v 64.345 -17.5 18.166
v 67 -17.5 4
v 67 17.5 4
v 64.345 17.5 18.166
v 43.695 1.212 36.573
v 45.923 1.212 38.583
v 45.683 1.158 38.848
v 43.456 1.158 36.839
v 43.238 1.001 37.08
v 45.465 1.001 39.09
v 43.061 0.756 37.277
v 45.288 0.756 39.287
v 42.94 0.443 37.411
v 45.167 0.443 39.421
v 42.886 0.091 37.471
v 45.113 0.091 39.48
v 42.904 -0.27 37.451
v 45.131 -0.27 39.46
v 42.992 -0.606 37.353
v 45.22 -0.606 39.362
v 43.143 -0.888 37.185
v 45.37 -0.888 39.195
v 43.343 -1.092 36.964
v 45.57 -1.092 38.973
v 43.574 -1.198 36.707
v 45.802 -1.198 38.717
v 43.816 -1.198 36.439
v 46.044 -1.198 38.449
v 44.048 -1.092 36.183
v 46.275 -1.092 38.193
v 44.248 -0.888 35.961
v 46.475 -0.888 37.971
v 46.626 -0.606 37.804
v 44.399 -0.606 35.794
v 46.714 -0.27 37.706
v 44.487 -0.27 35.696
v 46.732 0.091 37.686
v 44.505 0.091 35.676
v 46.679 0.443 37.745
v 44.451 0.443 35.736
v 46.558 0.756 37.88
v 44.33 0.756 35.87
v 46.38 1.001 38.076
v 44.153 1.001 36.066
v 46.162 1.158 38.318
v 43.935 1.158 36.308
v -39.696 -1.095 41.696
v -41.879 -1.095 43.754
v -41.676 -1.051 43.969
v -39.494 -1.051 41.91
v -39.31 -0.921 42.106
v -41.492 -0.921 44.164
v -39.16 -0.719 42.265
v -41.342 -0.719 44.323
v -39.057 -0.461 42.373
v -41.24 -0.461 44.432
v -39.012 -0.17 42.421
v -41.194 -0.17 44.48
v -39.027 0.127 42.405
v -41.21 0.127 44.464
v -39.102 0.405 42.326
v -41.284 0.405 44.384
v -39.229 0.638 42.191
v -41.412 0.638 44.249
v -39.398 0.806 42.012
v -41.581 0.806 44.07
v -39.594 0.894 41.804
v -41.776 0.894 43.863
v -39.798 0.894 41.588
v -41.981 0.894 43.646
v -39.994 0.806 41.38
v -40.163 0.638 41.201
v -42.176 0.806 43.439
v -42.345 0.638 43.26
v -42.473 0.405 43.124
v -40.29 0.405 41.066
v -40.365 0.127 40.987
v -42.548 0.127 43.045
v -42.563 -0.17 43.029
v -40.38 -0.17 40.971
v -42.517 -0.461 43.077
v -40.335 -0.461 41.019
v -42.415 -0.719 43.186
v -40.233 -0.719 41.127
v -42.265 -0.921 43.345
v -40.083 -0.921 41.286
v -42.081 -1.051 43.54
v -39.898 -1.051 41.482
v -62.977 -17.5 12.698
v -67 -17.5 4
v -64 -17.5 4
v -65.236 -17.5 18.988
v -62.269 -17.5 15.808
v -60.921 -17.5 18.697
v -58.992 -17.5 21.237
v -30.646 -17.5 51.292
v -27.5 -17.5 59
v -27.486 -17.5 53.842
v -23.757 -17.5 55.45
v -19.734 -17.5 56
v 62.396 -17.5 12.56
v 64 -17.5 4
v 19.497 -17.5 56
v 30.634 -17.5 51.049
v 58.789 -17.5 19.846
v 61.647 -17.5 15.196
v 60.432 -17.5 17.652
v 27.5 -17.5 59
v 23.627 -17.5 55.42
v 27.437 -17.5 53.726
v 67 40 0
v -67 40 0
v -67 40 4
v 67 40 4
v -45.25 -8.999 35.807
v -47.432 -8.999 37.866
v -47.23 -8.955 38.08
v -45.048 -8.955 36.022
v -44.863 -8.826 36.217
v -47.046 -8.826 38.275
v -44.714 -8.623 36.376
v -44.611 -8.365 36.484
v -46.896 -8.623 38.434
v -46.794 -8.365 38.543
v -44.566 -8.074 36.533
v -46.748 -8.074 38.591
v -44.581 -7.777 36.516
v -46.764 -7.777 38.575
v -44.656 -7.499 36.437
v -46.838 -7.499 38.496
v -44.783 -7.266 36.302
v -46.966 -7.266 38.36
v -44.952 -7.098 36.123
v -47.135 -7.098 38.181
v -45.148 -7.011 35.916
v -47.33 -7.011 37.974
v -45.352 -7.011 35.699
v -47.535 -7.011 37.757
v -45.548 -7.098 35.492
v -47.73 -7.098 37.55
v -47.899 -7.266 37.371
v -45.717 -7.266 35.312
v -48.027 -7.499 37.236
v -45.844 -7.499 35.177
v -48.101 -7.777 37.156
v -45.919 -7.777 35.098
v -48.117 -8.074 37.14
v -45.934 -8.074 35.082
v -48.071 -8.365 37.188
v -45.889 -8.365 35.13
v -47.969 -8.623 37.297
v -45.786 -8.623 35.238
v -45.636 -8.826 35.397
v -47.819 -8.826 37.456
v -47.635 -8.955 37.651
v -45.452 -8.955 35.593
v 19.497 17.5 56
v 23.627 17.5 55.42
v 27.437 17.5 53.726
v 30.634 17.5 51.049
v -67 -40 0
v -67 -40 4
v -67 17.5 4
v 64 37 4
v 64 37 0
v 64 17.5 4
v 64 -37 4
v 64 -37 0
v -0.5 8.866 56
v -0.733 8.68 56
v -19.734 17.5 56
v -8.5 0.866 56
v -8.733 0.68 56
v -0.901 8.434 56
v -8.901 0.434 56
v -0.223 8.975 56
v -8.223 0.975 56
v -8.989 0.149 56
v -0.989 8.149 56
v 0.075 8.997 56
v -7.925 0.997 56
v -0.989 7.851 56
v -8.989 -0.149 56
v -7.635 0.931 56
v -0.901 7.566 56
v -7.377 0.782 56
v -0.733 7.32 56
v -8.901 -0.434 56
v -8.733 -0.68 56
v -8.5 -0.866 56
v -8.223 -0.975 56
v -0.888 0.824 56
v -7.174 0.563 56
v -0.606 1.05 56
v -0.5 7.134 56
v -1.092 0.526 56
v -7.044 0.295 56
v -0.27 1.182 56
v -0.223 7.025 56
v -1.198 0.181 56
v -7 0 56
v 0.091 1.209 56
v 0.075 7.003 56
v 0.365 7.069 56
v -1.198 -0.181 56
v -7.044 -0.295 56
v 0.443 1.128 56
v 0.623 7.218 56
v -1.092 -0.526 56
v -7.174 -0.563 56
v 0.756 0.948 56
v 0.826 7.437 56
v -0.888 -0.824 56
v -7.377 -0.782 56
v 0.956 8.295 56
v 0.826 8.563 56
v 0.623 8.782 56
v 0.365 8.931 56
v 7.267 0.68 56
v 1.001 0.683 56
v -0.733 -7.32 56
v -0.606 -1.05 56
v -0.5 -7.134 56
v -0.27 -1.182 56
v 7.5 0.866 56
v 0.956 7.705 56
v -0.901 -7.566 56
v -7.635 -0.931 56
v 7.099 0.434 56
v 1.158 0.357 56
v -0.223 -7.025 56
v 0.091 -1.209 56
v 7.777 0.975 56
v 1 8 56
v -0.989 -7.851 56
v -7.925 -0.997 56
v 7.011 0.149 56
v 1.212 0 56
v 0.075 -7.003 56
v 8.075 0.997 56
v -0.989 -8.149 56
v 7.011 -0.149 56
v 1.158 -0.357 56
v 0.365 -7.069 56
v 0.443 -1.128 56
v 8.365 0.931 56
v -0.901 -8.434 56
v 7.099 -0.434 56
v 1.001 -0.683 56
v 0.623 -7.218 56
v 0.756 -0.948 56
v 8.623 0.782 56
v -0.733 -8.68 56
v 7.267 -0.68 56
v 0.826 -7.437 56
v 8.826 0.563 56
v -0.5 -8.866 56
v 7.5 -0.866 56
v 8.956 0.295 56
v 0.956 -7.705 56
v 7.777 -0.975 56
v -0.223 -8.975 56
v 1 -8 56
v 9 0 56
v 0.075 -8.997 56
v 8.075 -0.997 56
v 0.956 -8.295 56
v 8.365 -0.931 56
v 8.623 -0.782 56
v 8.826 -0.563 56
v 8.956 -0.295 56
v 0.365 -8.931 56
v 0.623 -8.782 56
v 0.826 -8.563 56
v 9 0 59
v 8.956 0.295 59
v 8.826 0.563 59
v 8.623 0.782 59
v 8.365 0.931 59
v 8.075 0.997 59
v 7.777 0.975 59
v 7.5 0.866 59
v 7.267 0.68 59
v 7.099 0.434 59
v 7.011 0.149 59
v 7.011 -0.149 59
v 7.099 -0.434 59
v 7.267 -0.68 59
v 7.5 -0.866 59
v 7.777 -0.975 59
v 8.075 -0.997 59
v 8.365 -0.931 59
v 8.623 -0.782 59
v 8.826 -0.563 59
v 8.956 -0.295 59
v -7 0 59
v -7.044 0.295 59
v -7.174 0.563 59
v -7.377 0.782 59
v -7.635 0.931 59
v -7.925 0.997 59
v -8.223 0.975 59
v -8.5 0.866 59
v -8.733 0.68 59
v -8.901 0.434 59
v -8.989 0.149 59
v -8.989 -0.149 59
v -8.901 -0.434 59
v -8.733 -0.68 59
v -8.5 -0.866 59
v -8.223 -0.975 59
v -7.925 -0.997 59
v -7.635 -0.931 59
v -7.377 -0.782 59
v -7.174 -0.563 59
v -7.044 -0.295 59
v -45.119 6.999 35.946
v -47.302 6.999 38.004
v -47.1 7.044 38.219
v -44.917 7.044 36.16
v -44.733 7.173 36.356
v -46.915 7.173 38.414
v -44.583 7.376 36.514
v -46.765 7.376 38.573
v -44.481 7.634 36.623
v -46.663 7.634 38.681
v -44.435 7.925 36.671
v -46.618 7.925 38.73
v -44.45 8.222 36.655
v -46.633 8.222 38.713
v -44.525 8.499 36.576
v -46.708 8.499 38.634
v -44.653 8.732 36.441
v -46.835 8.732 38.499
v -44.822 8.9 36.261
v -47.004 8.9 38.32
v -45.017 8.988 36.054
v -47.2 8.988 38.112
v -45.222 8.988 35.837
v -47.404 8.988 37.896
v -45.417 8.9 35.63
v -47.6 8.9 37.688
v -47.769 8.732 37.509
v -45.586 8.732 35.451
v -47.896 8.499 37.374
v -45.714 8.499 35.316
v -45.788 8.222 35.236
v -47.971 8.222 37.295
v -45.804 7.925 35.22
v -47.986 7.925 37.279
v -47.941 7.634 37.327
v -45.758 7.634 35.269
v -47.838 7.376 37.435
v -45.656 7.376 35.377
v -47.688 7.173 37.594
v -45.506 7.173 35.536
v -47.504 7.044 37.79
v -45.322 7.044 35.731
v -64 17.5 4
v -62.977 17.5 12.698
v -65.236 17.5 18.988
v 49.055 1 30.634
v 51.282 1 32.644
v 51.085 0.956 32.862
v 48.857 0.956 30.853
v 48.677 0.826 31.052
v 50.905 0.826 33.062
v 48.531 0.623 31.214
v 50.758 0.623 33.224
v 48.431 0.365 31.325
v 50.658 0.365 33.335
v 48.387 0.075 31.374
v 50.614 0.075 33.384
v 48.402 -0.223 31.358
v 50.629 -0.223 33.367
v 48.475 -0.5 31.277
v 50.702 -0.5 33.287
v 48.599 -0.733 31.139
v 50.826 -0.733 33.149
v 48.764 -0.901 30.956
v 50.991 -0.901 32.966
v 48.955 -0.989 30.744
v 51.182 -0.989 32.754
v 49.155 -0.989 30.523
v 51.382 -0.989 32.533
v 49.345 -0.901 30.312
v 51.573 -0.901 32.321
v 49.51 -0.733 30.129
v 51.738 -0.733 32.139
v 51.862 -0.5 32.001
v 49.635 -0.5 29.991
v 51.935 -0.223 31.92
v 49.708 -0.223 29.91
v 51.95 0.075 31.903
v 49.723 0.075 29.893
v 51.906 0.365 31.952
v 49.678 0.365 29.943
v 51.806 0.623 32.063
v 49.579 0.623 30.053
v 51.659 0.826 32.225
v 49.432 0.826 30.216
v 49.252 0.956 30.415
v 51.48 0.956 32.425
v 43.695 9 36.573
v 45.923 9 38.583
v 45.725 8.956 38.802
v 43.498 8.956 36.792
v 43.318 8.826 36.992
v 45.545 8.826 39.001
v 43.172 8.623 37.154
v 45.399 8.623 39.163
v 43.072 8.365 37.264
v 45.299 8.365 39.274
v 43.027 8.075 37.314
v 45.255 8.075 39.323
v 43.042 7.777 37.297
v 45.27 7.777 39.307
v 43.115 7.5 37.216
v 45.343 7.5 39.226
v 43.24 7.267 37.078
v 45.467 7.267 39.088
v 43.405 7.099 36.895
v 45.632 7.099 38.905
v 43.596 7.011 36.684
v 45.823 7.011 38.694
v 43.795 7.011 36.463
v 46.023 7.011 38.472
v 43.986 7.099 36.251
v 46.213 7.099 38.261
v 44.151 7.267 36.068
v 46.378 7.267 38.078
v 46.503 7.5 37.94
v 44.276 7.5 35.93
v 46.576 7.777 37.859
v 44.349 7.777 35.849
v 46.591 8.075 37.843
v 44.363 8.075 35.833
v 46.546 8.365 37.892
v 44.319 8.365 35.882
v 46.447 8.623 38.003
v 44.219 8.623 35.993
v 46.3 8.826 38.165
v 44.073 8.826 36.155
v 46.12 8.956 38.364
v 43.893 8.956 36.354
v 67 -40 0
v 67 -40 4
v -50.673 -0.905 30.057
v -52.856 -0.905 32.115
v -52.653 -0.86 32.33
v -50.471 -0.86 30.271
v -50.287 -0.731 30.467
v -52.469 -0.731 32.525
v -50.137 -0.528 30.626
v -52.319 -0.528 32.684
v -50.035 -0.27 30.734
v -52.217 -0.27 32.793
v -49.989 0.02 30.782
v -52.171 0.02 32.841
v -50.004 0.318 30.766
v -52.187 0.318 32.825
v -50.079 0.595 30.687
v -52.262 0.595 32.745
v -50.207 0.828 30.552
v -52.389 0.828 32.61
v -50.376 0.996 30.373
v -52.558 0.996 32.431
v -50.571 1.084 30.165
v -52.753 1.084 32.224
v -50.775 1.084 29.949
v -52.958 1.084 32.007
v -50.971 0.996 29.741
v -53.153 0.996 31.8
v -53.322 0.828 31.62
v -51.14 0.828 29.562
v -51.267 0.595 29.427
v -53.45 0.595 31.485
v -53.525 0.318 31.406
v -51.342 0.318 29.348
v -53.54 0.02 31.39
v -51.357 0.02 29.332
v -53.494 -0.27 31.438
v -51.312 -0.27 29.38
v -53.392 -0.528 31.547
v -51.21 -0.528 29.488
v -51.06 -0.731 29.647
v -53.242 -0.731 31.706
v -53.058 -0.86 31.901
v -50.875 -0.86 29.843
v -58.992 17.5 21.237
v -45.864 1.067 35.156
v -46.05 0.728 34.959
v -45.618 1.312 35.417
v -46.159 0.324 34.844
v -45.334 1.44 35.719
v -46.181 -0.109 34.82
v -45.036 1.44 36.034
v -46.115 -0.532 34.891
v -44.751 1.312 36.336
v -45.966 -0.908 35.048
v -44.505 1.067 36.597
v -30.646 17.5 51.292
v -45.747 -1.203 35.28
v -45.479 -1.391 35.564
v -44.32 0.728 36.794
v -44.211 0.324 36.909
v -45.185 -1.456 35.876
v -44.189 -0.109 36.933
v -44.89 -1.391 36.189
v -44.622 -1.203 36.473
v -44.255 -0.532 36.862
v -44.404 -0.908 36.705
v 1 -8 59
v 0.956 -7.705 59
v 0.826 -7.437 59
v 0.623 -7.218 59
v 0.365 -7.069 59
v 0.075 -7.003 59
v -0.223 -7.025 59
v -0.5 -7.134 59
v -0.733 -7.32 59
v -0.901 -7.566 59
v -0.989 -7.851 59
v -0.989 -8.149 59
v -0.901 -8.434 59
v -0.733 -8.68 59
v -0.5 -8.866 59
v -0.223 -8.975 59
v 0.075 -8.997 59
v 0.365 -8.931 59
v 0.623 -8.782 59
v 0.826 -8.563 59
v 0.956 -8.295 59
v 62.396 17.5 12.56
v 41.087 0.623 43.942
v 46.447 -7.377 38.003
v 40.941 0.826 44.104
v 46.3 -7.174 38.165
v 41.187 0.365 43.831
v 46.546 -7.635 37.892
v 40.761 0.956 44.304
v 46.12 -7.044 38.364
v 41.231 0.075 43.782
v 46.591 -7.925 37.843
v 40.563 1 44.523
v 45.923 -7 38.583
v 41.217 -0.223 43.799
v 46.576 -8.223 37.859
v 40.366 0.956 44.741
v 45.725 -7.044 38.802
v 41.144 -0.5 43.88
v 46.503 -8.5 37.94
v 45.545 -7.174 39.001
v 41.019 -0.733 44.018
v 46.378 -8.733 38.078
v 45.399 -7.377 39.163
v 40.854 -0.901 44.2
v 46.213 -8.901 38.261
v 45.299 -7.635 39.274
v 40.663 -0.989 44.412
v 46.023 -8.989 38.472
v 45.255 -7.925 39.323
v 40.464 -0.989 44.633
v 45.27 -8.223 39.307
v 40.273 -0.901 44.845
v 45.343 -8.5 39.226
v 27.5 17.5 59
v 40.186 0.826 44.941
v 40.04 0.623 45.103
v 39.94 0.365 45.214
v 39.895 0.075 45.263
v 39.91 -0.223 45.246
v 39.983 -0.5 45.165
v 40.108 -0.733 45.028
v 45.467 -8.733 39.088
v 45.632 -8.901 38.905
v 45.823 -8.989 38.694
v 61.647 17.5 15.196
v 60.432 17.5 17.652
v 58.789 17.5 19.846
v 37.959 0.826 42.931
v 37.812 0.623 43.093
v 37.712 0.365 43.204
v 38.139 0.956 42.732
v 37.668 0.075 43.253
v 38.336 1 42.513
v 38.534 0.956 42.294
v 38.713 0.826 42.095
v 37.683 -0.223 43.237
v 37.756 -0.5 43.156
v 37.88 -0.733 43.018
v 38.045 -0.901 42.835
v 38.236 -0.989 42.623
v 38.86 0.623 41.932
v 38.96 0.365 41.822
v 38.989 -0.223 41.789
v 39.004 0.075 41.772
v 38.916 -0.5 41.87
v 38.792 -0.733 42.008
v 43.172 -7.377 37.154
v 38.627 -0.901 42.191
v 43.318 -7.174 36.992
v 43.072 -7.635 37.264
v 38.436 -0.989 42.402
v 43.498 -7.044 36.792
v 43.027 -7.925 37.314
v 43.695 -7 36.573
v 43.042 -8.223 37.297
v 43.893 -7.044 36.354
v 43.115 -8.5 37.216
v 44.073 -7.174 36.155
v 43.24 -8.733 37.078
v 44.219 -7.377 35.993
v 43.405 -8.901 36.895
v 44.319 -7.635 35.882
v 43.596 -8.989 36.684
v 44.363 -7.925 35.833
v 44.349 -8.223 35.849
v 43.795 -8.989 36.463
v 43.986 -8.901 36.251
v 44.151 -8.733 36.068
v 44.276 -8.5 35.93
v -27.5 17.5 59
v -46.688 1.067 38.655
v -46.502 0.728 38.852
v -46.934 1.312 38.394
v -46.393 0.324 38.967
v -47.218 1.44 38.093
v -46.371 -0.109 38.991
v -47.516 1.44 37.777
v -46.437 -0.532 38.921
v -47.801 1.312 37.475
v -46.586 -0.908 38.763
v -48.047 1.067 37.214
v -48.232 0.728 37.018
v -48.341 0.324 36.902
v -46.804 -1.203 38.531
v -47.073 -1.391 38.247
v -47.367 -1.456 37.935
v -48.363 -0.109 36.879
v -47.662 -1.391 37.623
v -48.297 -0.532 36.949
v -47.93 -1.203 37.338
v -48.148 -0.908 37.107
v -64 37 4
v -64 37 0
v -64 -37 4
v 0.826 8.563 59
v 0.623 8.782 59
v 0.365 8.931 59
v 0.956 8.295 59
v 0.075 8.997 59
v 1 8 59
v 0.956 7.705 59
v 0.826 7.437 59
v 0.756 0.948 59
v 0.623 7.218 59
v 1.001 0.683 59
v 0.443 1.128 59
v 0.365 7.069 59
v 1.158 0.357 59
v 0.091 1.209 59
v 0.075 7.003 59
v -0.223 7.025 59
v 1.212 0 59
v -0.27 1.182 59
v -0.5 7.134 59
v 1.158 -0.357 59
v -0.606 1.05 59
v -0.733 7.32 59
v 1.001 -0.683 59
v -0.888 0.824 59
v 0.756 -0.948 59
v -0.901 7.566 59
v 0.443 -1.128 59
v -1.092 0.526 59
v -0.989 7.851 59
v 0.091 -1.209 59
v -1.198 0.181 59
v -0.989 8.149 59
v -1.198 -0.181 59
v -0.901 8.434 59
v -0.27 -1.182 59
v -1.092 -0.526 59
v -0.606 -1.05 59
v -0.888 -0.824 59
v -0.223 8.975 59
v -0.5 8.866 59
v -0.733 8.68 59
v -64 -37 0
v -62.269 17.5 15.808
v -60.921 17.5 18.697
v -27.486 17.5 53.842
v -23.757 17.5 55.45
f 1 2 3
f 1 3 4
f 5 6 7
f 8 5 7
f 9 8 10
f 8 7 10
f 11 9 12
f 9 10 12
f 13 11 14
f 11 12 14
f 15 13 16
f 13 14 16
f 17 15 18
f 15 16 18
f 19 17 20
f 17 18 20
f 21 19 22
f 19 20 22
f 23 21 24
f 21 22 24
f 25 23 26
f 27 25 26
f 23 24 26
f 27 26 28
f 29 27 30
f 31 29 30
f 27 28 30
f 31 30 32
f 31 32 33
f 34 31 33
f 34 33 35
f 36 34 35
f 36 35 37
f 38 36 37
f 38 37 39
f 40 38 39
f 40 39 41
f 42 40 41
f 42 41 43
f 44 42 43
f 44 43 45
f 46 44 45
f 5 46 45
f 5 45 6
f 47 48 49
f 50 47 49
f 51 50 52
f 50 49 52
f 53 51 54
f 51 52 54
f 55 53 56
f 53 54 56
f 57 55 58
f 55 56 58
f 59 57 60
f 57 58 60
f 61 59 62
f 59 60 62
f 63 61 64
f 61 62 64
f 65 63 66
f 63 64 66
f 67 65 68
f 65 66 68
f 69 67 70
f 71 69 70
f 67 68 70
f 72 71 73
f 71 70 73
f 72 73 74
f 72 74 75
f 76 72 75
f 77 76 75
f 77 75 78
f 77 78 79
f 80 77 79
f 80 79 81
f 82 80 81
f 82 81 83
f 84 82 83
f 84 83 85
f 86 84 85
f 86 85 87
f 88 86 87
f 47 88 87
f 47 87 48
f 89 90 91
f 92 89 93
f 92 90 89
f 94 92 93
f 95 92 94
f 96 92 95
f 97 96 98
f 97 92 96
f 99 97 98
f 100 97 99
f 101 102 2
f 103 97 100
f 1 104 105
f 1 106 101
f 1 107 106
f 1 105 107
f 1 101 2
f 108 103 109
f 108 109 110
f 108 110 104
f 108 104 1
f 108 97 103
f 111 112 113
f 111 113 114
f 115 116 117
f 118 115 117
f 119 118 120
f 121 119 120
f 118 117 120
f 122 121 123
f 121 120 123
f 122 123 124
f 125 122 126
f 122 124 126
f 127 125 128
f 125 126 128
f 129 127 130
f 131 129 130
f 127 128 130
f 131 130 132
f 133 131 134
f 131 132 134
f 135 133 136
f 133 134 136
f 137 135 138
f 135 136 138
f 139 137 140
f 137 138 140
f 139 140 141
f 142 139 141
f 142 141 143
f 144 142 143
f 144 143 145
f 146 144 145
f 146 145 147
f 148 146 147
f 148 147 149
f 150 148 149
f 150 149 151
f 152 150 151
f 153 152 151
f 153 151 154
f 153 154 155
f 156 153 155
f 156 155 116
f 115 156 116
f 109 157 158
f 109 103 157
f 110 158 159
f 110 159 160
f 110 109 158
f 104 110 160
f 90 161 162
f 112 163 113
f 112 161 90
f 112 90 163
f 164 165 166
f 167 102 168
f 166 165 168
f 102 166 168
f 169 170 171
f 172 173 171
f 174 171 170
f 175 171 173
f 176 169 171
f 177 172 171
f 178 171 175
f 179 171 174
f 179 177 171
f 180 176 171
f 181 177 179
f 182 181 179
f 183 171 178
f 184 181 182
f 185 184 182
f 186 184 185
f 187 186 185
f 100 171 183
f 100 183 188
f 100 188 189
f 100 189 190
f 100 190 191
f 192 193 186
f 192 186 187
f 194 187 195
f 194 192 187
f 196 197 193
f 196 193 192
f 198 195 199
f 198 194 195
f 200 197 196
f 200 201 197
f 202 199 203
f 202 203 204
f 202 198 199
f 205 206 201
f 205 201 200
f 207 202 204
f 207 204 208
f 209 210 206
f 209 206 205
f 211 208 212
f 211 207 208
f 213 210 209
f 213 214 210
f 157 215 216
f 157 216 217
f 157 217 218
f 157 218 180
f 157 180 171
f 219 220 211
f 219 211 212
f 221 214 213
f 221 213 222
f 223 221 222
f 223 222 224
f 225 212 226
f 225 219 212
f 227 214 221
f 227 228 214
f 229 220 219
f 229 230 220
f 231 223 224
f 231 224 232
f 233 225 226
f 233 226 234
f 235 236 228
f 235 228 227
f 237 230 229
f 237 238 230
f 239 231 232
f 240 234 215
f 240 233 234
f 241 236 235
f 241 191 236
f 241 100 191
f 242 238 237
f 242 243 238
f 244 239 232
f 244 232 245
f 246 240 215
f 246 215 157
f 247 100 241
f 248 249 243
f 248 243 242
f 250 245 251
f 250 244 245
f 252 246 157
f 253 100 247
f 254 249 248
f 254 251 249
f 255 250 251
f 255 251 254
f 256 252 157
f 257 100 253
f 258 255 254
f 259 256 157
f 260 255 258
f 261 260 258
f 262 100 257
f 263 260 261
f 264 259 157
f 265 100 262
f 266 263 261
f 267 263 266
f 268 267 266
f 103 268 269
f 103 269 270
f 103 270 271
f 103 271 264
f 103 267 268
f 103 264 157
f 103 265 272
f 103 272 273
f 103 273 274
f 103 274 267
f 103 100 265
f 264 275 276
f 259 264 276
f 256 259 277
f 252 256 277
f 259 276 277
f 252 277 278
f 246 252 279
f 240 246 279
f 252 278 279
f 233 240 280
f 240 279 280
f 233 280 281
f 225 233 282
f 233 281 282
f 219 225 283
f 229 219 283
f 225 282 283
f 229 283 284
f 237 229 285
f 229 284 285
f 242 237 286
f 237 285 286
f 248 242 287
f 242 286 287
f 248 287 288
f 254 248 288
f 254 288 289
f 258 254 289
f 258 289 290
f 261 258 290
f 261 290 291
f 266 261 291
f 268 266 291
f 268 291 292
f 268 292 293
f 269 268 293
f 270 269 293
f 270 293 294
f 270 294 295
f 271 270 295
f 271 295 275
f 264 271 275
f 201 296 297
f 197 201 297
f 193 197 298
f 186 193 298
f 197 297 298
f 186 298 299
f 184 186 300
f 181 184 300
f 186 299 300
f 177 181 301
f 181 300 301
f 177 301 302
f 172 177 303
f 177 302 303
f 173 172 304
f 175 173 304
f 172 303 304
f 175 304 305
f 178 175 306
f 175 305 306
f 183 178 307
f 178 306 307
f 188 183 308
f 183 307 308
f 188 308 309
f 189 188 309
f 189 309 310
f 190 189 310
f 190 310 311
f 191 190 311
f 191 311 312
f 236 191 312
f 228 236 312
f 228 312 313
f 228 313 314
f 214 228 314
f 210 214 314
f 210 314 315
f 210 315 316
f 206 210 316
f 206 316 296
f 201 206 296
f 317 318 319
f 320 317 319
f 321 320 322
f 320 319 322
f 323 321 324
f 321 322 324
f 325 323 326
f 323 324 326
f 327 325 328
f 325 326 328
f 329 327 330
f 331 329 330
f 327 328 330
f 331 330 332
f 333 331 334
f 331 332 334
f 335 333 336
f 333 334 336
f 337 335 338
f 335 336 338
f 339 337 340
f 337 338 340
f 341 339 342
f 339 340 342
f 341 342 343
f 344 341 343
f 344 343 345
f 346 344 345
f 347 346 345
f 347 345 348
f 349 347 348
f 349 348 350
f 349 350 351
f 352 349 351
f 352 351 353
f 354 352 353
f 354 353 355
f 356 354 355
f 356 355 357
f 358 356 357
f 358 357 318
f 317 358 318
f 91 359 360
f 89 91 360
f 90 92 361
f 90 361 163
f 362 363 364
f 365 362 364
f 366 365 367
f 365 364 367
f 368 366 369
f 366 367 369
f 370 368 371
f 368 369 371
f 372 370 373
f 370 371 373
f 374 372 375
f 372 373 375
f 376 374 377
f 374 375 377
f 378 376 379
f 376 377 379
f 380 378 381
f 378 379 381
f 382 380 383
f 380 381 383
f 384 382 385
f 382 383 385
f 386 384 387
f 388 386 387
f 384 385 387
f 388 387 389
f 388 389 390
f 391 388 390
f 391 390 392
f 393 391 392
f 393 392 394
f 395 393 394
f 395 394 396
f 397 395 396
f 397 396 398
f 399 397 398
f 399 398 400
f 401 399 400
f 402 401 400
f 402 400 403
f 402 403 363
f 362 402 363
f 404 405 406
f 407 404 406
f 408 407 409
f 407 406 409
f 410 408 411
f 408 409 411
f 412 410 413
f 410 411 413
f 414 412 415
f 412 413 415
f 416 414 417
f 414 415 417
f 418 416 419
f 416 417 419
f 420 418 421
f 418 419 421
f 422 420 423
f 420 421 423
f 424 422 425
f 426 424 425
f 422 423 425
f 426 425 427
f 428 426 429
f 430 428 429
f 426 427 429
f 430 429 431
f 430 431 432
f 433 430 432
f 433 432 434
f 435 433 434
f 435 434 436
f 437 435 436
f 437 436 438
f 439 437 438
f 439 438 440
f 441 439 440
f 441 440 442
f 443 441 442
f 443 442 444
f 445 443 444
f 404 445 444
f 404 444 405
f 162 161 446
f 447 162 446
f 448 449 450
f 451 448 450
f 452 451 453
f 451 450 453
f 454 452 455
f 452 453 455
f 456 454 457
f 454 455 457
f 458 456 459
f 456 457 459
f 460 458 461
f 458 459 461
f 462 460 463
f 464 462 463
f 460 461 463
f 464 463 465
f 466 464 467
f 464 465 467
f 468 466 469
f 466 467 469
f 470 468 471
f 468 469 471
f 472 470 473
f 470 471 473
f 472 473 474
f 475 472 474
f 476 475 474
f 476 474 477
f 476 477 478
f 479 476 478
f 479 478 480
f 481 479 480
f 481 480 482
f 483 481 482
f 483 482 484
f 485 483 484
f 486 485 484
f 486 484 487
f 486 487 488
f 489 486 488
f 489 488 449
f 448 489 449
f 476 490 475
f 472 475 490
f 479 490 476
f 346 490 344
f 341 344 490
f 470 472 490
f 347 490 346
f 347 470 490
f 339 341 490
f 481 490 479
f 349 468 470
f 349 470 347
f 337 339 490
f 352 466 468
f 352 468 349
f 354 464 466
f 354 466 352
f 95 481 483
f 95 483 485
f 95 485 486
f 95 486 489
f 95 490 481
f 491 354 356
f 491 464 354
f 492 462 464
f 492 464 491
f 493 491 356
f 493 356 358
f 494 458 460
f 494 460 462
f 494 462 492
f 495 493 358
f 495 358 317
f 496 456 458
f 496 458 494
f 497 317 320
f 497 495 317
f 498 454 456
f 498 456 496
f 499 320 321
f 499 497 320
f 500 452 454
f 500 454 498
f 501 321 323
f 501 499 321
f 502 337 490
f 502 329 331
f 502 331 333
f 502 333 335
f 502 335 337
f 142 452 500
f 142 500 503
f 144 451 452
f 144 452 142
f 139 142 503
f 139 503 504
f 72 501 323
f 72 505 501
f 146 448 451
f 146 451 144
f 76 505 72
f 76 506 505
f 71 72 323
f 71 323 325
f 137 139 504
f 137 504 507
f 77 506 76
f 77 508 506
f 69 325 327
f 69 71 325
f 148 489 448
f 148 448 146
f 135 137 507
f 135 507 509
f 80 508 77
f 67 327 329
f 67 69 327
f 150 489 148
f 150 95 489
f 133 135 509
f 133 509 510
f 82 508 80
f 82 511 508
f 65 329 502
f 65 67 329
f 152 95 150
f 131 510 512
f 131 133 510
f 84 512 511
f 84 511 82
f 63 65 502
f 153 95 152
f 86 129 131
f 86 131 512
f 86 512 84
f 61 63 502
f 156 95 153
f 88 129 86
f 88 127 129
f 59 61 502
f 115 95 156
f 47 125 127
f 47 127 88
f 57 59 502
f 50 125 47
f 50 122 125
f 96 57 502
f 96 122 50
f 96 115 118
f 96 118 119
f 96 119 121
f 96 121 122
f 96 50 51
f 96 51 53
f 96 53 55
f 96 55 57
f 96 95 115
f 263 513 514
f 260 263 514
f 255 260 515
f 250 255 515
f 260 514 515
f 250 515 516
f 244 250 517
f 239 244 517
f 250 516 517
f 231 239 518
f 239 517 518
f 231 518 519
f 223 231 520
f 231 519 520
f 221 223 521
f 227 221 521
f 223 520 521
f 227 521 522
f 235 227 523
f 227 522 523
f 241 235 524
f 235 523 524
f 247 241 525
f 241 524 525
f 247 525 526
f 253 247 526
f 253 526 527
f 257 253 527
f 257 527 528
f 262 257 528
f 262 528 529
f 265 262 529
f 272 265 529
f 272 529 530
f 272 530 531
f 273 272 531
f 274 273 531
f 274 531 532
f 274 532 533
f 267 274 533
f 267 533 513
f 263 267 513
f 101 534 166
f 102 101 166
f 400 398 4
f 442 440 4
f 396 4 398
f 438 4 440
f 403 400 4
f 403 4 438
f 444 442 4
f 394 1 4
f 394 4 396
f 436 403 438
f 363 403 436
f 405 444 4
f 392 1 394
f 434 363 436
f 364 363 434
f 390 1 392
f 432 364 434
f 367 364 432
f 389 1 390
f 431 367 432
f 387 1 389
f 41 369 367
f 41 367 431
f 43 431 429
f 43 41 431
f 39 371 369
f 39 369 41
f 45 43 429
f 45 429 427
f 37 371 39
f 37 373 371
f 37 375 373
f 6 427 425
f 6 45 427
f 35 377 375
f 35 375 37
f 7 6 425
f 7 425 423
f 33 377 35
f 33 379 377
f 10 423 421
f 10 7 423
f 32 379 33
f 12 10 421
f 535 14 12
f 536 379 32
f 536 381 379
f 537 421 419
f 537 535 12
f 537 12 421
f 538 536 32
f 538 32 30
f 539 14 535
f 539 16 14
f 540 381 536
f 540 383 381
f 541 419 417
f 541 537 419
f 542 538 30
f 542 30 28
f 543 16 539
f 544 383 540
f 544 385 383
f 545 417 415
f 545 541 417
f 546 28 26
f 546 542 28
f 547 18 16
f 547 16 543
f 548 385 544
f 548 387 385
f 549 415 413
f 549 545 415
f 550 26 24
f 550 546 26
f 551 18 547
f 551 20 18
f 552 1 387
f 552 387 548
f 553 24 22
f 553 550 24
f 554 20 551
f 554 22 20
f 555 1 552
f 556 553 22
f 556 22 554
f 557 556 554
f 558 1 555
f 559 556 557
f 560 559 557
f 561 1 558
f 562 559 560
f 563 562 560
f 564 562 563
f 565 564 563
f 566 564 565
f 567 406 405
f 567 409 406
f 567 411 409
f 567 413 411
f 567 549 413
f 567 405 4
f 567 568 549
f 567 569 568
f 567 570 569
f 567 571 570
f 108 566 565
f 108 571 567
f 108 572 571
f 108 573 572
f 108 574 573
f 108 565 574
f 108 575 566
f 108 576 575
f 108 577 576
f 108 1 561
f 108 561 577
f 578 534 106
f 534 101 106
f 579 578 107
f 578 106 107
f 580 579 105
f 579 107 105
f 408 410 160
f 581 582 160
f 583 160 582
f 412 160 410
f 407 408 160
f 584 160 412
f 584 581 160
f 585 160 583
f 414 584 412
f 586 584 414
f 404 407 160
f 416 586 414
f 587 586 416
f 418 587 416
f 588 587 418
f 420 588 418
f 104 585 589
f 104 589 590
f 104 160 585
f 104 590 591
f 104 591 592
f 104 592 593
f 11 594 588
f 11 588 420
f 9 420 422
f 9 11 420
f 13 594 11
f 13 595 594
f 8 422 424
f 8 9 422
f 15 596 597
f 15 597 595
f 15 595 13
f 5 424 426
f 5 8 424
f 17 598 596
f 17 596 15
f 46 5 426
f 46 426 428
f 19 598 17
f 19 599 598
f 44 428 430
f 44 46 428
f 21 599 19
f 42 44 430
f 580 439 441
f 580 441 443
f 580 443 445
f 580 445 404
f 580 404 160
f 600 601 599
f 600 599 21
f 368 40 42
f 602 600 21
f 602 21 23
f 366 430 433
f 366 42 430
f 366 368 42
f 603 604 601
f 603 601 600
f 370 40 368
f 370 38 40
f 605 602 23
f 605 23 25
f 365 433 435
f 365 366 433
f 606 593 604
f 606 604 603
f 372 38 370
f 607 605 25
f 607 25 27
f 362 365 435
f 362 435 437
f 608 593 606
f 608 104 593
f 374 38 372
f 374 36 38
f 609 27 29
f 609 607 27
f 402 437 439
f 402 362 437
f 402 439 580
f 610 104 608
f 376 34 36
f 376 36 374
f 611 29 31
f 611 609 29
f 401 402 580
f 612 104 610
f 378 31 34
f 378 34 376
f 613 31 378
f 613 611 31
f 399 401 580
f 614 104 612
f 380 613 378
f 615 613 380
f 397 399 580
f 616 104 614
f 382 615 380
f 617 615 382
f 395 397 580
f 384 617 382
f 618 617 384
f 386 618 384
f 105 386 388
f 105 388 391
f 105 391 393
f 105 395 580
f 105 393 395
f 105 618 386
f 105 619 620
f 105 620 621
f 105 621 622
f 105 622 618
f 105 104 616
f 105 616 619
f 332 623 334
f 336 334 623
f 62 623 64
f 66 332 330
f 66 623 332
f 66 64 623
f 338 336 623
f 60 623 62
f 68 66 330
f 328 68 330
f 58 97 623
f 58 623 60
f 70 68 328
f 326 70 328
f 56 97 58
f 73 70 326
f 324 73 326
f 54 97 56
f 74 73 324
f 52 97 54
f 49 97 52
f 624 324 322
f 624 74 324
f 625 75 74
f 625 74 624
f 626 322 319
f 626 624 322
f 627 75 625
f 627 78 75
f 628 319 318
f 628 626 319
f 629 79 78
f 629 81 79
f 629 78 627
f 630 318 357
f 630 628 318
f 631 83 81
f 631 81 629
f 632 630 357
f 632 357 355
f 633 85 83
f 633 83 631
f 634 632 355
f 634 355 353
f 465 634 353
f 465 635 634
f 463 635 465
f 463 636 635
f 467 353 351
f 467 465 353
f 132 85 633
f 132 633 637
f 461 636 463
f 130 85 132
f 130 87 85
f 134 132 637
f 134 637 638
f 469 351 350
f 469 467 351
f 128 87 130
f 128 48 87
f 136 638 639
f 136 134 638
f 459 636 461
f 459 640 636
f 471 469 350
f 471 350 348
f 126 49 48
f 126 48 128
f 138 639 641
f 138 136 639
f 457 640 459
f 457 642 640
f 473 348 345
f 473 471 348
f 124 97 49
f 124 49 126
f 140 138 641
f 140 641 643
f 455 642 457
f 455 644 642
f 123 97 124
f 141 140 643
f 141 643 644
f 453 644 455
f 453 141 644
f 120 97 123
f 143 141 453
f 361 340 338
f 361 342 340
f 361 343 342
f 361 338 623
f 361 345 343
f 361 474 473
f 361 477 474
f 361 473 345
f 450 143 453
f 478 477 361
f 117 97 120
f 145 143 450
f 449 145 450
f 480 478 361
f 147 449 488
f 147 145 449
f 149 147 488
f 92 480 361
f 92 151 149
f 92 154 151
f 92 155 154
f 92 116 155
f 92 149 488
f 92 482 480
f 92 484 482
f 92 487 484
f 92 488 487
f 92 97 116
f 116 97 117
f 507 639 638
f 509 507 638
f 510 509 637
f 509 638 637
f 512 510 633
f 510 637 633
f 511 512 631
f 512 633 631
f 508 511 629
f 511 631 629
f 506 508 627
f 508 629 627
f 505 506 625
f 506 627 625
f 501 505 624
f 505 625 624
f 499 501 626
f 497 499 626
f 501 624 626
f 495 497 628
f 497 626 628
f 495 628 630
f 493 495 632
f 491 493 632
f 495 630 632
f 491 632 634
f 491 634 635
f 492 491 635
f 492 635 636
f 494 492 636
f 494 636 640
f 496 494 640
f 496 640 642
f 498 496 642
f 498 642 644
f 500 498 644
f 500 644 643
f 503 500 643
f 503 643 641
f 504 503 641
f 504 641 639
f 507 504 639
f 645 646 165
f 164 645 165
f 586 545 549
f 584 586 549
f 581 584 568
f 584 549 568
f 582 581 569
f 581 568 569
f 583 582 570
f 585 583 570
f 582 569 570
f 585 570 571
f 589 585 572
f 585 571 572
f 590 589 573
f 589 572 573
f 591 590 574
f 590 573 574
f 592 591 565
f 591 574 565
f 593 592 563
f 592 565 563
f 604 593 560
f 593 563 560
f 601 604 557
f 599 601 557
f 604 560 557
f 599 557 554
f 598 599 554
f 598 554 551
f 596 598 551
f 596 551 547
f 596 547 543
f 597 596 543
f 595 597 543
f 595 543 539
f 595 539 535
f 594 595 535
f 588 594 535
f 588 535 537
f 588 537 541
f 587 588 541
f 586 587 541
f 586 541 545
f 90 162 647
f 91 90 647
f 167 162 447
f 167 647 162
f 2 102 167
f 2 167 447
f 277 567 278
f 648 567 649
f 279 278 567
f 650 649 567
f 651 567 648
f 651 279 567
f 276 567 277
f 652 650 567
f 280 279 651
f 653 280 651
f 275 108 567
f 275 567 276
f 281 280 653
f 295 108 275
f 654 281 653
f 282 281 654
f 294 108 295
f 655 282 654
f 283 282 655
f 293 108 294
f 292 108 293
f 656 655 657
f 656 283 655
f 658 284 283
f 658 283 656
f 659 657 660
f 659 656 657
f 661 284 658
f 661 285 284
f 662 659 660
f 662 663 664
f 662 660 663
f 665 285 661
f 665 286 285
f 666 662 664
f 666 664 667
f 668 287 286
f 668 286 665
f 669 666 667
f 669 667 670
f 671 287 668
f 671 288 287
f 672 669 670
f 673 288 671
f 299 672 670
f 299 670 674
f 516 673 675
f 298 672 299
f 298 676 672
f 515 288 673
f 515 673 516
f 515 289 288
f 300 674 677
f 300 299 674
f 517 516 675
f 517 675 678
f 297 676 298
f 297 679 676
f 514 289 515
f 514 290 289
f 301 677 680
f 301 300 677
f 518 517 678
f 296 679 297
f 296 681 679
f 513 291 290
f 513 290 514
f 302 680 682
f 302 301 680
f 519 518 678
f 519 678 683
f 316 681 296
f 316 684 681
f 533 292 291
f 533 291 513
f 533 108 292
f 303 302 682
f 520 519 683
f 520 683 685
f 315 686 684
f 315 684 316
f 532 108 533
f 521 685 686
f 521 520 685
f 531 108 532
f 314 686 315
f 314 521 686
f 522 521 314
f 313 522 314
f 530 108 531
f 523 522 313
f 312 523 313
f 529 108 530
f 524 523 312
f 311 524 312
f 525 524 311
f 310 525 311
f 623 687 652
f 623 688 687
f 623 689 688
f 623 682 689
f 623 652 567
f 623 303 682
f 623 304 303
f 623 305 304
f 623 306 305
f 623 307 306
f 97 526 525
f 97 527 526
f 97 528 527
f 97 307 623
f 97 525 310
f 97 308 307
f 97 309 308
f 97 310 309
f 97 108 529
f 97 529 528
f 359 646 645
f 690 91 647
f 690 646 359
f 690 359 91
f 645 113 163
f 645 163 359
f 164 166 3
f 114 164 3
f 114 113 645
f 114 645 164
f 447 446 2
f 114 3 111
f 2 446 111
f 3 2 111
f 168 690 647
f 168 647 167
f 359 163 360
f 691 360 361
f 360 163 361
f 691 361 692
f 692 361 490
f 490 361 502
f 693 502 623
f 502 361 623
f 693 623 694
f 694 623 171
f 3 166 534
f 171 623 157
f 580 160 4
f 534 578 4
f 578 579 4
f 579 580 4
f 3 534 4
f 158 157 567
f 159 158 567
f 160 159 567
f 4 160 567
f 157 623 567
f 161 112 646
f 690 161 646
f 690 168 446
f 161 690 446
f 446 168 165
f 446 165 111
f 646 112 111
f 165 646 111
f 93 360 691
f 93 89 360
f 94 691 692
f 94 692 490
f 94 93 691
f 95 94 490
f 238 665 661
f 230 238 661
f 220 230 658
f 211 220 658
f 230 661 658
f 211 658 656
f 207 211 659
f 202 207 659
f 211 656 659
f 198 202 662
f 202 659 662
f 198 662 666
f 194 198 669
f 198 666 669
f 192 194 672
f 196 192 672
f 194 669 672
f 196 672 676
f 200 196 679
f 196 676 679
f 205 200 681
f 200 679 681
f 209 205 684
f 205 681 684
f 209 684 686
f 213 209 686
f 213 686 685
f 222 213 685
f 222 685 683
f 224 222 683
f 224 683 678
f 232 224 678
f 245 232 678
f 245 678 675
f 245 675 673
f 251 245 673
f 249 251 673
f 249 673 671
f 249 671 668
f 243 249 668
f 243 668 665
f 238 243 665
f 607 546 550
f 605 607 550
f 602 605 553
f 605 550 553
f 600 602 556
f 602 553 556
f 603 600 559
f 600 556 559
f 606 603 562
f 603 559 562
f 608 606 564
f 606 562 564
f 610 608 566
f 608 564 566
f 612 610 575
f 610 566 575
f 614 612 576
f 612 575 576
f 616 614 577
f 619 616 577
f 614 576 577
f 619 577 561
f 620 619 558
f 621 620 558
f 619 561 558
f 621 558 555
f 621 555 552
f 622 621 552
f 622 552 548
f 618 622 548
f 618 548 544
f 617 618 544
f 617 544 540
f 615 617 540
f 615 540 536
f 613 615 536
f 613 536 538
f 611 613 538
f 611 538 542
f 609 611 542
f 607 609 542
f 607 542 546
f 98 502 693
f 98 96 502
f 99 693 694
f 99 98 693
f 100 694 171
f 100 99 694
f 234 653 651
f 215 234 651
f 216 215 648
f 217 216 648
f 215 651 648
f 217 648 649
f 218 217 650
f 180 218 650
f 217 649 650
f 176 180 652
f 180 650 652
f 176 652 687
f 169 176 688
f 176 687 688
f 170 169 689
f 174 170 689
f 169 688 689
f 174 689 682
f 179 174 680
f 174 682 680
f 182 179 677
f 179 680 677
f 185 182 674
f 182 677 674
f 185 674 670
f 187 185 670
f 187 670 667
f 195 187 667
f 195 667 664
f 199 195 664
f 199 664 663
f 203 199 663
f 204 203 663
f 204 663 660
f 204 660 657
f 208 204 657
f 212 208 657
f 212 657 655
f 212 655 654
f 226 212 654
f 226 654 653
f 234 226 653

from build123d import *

# Parameters (mm, degrees)
F0_W          = 134
F0_H          = 80
F1_DEPTH      = 4
F2_W          = 128
F2_H          = 74
F2_W_2        = 122
F2_H_2        = 68
F3_DEPTH      = 2
F3_DEPTH_BACK = 4
F5_DEPTH      = 17.5
F6_R          = 1.2120191714
F6_R_2        = 1
F9_DEPTH      = 25
F7_R          = 1.4559122593
F7_R_2        = 1
F10_DEPTH     = 25
F8_R          = 1.2120191714
F8_R_2        = 1
F11_DEPTH     = 25
F12_R         = 15


with BuildPart() as f1:
    # F0 (on Top) → F1 (new body)
    with BuildSketch(Plane.XY):
        Rectangle(F0_W, F0_H)
    extrude(amount=F1_DEPTH)

    # F2 (on face) → F3 (cut, two sides)
    with BuildSketch(Plane(origin=(0, 0, 0), x_dir=(1, 0, 0), z_dir=(0, 0, -1))) as f3_sk:
        Rectangle(F2_W, F2_H)
        Rectangle(F2_W_2, F2_H_2, mode=Mode.SUBTRACT)
        Rectangle(F2_W_2, F2_H_2)
    extrude(amount=F3_DEPTH, mode=Mode.SUBTRACT)
    extrude(f3_sk.sketch, amount=-F3_DEPTH_BACK, mode=Mode.SUBTRACT)

    # F4 (on Front) → F5 (join, symmetric)
    with BuildSketch(Plane.XZ):
        Polygon((-27.5, 59), (-65.2364429114, 18.9879908478), (-67, 4), (-64, 4), (-62.3966282188, 17.6266195959), (-26.205621828, 56), (26.166218832, 56), (61.6182726396, 16.71034506), (64, 4), (67, 4), (64.3454915045, 18.1660710219), (27.5, 59), align=None)
    extrude(amount=F5_DEPTH, both=True)

    # F6 (on face) → F9 (cut)
    with BuildSketch(Plane.XY.offset(59)):
        Circle(F6_R)
        with Locations((-8, 0)):
            Circle(F6_R_2)
        with Locations((0, -8)):
            Circle(F6_R_2)
        with Locations((8, 0)):
            Circle(F6_R_2)
        with Locations((0, 8)):
            Circle(F6_R_2)
    extrude(amount=-F9_DEPTH, mode=Mode.SUBTRACT)

    # F7 (on face) → F10 (cut)
    with BuildSketch(Plane(origin=(-44.0036916199, 0, 41.501110089), x_dir=(0, -1, 0), z_dir=(-0.7274910755, 0, 0.6861171438))):
        with Locations((0, -4.9021602608)):
            Circle(F7_R)
        with Locations((-7.9994338844, -4.8069892056)):
            Circle(F7_R_2)
        with Locations((-0.0951710552, -12.9015941452)):
            Circle(F7_R_2)
        with Locations((7.9994338844, -4.997331316)):
            Circle(F7_R_2)
        with Locations((0.0951710552, 3.0972736235)):
            Circle(F7_R_2)
    extrude(amount=-F10_DEPTH, mode=Mode.SUBTRACT)

    # F8 (on face) → F11 (cut)
    with BuildSketch(Plane(origin=(44.5031382137, 0, 40.1563122143), x_dir=(0, 1, 0), z_dir=(0.7424350723, 0, 0.6699180274))):
        with Locations((0, -2.1190764849)):
            Circle(F8_R)
        with Locations((-8, -2.1190764849)):
            Circle(F8_R_2)
        with Locations((0, -10.1190764849)):
            Circle(F8_R_2)
        with Locations((8, -2.1190764849)):
            Circle(F8_R_2)
        with Locations((0, 5.8809235151)):
            Circle(F8_R_2)
    extrude(amount=-F11_DEPTH, mode=Mode.SUBTRACT)

    # F12
    f12_edges = [f1.edges().sort_by_distance(p)[0] for p in [
        (26.166219, 0, 56),
        (-26.205622, 0, 56),
        (61.618273, 0, 16.710345),
        (-62.396628, 0, 17.62662),
    ]]
    fillet(f12_edges, radius=F12_R)


solid = f1.part
